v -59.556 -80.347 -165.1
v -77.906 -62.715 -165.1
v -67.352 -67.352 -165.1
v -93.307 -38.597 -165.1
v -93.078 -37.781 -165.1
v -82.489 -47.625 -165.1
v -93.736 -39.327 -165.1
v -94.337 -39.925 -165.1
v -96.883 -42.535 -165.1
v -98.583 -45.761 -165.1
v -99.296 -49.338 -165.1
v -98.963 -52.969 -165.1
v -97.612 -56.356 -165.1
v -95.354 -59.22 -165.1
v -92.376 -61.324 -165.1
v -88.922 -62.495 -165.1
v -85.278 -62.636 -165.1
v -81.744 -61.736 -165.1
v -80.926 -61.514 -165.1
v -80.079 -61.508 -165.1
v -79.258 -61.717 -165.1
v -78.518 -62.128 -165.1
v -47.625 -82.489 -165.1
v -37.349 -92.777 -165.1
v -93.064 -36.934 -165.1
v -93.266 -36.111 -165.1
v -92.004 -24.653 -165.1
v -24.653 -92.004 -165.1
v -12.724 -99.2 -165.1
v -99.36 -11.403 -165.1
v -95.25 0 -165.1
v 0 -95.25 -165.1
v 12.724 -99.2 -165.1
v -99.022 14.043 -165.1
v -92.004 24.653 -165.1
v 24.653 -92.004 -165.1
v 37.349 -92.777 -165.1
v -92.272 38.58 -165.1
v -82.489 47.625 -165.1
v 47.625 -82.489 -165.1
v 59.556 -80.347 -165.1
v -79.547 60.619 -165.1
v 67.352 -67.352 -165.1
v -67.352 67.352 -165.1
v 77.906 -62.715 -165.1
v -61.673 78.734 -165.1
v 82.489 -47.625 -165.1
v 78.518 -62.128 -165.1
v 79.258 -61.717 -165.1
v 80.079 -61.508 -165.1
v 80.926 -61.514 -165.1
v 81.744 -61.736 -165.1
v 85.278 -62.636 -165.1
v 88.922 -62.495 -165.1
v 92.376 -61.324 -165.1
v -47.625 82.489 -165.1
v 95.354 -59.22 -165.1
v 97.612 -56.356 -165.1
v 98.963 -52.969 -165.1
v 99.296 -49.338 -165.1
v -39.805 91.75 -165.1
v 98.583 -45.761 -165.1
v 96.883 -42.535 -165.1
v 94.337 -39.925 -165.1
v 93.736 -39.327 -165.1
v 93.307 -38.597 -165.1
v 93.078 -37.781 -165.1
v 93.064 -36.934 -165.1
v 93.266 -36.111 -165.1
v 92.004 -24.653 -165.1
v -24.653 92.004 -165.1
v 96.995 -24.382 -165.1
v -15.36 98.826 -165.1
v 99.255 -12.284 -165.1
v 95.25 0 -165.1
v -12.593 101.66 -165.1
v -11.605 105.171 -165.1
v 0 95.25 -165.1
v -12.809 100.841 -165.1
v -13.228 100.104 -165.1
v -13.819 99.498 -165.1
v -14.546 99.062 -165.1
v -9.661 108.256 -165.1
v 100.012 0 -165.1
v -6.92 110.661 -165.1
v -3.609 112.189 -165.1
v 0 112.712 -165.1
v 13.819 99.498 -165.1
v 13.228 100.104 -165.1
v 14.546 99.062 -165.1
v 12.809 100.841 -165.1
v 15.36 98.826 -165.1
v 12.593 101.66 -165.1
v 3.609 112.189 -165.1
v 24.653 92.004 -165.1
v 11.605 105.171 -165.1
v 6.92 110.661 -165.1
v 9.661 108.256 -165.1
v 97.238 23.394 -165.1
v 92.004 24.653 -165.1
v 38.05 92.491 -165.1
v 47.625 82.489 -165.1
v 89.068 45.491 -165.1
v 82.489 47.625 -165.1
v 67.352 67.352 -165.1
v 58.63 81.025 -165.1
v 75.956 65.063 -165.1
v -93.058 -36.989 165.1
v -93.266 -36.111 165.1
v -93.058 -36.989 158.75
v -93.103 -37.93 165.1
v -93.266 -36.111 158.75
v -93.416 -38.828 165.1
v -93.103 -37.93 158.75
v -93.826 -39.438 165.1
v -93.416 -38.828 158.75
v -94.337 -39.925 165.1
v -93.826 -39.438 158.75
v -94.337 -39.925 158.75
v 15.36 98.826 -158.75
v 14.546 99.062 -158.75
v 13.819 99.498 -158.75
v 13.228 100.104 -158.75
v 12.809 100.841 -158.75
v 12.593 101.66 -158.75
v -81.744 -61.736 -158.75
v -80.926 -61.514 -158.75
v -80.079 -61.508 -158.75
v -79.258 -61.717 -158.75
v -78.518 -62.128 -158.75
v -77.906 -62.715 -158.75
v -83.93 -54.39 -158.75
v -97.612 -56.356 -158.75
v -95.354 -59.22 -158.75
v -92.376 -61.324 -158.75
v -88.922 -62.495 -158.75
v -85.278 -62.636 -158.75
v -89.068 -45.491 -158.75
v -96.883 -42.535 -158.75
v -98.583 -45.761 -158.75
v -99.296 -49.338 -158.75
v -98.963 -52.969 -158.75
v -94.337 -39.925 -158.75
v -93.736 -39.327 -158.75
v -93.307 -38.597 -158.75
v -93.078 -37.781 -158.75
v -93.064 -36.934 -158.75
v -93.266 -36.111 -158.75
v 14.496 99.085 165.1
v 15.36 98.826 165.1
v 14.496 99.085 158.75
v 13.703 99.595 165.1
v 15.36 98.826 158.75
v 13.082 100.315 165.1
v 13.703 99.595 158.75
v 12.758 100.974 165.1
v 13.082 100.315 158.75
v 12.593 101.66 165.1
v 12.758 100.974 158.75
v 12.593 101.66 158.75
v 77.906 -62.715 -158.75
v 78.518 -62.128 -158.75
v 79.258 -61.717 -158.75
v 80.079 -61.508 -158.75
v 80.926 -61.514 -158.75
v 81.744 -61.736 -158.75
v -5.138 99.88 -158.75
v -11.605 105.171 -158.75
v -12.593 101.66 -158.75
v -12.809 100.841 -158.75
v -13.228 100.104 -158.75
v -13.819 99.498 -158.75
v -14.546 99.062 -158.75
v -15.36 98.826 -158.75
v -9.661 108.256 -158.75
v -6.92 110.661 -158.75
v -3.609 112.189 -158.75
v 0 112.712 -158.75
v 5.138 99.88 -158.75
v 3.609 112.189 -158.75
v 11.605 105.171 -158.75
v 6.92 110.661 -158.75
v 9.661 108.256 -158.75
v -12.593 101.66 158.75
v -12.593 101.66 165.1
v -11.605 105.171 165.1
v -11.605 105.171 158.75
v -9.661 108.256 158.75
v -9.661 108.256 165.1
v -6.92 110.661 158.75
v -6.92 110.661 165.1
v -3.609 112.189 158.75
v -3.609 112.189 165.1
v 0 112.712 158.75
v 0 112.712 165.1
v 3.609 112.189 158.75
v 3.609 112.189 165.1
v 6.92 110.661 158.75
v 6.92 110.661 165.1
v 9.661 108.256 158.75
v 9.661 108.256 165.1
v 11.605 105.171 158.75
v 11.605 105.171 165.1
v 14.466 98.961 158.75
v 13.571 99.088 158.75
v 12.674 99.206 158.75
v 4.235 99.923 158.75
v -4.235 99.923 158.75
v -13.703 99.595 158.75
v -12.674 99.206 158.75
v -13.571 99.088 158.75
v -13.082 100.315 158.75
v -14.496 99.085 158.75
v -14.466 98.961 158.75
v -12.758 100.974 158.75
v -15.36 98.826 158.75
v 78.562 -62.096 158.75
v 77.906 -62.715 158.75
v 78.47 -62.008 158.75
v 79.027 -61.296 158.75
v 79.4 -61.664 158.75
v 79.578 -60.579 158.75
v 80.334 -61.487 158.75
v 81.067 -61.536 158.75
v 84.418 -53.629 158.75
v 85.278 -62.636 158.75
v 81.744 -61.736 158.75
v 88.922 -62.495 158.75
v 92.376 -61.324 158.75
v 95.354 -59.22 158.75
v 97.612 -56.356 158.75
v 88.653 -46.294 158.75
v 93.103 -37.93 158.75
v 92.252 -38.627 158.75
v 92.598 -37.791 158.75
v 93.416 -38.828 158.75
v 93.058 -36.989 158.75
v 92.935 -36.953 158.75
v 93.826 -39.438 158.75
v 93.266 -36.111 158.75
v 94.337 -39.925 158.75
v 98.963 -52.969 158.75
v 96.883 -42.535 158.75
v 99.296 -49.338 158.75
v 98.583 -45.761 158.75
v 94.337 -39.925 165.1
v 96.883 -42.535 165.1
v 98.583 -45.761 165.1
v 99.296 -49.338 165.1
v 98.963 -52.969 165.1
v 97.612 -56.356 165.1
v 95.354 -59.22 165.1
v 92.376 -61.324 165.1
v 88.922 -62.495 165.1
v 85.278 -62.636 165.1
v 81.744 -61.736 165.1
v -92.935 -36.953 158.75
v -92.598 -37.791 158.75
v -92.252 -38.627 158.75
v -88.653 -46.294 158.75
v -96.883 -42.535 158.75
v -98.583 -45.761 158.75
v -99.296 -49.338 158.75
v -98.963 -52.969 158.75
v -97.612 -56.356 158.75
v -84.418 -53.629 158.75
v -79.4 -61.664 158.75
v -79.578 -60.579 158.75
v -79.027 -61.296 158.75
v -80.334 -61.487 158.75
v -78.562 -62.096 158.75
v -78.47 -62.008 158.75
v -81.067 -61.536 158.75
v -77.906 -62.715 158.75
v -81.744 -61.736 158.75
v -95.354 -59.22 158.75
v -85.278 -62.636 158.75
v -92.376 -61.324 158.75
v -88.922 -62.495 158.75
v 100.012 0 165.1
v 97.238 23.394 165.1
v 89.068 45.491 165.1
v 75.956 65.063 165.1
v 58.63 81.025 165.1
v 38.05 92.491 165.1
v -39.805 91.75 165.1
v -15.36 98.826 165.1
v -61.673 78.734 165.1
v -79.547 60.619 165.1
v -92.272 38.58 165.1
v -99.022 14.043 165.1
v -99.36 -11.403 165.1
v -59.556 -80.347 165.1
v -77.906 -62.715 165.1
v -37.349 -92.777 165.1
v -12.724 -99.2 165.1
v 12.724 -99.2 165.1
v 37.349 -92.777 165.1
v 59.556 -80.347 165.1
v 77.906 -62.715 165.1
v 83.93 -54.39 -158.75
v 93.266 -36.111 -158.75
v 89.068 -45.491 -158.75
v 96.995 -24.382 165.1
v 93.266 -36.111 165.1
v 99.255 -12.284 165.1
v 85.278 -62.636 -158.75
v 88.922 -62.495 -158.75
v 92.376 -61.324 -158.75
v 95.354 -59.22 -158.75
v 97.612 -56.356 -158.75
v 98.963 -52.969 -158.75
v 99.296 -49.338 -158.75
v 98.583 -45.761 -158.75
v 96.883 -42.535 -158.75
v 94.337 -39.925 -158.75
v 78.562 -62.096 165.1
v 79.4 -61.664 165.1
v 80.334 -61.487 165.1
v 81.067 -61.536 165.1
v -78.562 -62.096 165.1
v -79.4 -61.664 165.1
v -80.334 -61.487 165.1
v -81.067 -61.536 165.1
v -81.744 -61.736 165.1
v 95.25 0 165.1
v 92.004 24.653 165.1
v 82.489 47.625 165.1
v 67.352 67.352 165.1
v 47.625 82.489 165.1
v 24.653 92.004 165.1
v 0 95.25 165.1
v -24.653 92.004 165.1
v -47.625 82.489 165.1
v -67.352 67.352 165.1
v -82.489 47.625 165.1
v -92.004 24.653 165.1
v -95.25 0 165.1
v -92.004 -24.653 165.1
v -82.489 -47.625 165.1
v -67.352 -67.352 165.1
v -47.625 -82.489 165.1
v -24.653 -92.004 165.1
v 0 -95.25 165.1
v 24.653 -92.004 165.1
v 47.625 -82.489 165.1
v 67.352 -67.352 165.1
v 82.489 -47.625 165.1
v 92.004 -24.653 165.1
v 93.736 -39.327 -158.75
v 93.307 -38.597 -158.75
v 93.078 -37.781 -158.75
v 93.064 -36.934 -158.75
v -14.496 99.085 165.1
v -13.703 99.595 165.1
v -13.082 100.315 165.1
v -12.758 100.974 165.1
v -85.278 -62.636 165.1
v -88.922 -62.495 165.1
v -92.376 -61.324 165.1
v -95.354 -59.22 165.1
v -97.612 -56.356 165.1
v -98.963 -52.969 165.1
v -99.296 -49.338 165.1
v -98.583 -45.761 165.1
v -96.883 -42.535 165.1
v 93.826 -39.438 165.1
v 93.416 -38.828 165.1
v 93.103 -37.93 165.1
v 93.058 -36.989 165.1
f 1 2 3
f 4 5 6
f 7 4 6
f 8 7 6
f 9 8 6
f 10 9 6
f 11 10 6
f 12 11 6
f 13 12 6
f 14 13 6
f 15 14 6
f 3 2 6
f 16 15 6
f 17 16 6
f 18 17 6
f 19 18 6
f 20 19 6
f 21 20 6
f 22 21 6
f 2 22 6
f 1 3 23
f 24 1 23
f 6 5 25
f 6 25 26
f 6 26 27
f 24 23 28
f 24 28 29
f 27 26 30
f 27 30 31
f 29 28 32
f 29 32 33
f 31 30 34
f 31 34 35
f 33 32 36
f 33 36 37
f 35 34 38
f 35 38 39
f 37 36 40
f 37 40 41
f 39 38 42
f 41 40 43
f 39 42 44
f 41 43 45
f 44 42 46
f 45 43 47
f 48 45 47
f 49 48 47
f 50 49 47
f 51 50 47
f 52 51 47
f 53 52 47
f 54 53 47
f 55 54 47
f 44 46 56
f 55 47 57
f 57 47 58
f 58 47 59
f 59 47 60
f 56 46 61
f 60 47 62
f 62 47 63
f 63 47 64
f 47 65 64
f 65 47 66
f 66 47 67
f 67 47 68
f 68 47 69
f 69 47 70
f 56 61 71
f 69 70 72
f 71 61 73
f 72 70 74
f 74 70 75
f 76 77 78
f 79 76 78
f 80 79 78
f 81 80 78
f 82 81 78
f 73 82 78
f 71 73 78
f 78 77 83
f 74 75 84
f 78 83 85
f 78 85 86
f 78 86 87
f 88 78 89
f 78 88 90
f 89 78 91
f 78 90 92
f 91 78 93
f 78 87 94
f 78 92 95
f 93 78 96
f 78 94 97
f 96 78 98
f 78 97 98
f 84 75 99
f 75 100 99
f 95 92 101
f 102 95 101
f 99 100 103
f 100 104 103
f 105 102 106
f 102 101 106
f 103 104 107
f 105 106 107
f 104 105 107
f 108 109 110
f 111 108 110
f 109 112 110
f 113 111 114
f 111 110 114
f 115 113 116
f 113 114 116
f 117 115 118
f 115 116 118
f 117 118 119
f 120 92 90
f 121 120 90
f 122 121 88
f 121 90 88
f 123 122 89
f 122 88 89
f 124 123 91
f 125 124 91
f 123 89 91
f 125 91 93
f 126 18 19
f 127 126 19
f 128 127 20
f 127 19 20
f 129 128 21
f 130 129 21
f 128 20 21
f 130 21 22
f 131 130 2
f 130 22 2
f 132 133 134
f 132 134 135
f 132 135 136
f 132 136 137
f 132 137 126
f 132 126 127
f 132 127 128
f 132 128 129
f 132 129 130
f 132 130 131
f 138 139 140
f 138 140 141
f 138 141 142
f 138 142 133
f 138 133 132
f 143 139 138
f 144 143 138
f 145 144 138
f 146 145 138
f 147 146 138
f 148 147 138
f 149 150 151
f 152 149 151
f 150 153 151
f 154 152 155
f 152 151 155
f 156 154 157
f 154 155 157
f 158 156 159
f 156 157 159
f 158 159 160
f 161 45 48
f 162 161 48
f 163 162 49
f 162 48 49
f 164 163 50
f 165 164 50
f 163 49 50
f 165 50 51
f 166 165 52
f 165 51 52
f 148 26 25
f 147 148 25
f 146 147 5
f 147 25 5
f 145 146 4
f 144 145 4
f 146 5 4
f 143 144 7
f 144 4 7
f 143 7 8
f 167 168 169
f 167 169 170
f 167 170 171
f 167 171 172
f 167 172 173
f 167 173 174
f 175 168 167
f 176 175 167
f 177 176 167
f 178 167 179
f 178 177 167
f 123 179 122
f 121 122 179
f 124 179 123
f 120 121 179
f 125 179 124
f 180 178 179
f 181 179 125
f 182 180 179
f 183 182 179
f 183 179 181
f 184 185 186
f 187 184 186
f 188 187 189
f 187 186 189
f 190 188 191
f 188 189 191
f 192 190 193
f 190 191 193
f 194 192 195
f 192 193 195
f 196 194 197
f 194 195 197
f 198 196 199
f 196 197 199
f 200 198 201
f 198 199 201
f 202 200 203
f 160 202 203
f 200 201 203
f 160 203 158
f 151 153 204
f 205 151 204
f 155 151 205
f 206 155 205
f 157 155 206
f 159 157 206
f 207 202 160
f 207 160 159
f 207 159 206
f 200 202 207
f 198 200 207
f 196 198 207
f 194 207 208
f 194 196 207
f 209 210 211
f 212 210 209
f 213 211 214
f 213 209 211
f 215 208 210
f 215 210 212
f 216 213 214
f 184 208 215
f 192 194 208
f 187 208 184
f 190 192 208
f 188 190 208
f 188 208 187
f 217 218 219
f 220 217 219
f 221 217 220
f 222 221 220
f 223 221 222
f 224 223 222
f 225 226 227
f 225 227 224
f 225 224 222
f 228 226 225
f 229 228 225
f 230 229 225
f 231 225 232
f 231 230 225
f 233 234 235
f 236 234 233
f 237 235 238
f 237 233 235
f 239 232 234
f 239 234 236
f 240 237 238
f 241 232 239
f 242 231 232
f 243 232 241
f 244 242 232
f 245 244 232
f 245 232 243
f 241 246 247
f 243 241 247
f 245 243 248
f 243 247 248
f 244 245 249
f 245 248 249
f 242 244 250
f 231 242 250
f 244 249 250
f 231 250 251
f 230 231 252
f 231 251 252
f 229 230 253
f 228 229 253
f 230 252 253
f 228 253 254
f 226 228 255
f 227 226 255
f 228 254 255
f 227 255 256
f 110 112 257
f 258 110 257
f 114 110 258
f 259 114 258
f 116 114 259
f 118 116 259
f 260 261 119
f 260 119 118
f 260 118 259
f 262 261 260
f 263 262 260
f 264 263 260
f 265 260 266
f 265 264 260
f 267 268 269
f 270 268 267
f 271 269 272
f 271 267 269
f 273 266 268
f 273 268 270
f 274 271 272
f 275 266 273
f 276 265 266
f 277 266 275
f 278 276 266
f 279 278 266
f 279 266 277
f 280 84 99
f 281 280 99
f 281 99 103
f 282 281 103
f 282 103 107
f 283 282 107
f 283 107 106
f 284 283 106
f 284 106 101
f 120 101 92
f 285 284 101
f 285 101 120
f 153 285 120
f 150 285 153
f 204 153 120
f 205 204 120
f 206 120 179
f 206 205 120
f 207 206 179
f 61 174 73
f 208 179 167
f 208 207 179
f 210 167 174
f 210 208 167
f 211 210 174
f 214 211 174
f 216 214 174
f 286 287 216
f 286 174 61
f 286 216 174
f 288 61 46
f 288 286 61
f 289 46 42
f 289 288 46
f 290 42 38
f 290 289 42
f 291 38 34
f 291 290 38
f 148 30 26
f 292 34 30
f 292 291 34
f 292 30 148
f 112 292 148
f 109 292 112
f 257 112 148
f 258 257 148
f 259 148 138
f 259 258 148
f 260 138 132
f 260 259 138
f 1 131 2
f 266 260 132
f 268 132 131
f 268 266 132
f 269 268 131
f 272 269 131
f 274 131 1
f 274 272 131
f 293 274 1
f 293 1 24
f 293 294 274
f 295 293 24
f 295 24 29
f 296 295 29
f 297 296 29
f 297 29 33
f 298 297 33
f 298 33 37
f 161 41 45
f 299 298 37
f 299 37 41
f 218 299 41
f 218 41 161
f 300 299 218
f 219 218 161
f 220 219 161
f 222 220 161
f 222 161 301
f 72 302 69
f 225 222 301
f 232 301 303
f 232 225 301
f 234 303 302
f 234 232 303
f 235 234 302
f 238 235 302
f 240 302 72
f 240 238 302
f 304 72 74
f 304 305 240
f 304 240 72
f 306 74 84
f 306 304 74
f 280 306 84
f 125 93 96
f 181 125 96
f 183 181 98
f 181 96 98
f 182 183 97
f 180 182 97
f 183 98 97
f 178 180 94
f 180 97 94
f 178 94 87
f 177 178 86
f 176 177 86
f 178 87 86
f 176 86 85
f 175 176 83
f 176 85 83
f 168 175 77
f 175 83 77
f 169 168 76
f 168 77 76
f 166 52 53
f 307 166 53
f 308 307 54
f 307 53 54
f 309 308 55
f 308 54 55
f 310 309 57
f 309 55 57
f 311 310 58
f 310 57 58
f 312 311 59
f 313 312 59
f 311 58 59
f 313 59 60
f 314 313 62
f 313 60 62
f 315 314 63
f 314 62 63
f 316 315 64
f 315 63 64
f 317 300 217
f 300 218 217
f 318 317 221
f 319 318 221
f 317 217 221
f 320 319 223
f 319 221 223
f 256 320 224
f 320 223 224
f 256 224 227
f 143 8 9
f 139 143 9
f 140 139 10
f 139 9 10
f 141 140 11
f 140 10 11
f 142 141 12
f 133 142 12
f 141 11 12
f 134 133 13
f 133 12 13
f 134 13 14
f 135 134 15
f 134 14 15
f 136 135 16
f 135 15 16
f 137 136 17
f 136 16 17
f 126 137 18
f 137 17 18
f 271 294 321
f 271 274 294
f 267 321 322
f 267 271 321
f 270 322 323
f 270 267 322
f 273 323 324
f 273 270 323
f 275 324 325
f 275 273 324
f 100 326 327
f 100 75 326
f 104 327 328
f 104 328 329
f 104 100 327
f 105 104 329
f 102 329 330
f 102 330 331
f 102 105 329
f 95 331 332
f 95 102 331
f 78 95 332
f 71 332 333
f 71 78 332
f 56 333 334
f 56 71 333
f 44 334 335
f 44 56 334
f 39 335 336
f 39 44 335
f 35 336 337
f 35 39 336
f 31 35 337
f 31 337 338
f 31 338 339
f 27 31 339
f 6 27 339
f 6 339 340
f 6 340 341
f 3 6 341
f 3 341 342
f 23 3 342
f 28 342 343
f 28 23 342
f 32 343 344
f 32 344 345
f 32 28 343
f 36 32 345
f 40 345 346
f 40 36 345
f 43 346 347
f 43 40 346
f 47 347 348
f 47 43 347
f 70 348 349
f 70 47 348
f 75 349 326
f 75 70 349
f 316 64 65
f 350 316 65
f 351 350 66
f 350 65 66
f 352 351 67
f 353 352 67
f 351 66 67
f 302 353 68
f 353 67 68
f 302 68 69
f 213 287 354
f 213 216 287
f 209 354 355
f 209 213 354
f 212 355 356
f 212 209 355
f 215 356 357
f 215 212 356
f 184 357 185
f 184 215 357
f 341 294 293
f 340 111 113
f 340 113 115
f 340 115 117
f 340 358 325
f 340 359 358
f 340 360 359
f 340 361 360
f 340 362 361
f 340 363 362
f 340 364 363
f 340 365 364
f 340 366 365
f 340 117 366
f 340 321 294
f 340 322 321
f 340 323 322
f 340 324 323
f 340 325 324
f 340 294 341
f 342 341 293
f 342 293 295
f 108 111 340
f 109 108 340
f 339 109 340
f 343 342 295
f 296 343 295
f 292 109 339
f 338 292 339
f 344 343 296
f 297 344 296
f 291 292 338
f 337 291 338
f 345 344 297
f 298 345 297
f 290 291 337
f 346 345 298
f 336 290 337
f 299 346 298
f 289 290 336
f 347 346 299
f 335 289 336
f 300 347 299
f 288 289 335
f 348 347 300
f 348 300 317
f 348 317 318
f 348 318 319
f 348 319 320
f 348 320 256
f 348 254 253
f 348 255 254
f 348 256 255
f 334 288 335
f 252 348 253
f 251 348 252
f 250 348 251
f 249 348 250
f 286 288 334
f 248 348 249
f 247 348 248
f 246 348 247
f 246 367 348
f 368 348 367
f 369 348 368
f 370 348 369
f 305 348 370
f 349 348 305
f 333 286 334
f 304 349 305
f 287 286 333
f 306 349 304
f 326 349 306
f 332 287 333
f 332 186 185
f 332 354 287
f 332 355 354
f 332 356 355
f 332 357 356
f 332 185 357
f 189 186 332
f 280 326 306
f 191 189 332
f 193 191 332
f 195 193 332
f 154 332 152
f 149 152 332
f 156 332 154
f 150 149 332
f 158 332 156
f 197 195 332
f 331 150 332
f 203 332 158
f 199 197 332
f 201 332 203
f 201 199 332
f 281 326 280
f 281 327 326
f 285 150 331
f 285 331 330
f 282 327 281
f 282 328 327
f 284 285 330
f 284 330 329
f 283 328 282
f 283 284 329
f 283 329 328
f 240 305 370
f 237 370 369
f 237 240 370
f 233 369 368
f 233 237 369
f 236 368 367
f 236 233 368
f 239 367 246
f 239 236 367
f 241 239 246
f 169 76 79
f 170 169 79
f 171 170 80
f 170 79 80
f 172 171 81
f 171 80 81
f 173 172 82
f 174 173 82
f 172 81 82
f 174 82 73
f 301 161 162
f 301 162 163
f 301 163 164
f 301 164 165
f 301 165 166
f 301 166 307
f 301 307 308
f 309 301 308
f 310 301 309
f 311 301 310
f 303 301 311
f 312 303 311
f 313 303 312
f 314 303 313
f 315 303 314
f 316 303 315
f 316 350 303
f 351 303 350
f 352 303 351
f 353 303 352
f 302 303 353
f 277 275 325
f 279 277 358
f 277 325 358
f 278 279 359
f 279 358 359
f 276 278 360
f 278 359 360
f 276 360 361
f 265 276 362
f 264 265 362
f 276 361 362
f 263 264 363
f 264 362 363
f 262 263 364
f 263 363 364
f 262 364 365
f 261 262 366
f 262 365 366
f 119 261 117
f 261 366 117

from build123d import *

# Parameters (mm, degrees)
SKETCH1_R                = 100.0125
SKETCH1_R_2              = 95.25
EXTRUDE_THIN1_DEPTH      = 165.1
BOSS_EXTRUDE1_DEPTH      = 6.35
FILLET1_R                = 3.302
CIRPATTERN1_COUNT        = 3
FILLET1_OF_CIRPATTERN1_R = 3.302
MIRROR2_START            = -165.1
MIRROR2_DEPTH            = 6.35


# Read off the part's stored shape, not the designer's step: Mirror2
with BuildPart() as part:
    # Sketch1 → Extrude-Thin1 (new, symmetric)
    with BuildSketch(Plane.XY):
        Circle(SKETCH1_R)
        Circle(SKETCH1_R_2, mode=Mode.SUBTRACT)
    extrude(amount=EXTRUDE_THIN1_DEPTH, both=True)

    # Sketch2 → Boss-Extrude1 (add)
    with BuildSketch(Plane.XY.offset(165.1)):
        with BuildLine():
            ThreePointArc((-12.674375762, 99.206150794), (0, 112.7125), (12.674375762, 99.206150794))
            ThreePointArc((12.674375762, 99.206150794), (0, 100.0125), (-12.674375762, 99.206150794))
        make_face()
    boss_extrude1 = extrude(amount=-BOSS_EXTRUDE1_DEPTH)

    # Fillet1
    fillet1_edges = [part.edges().sort_by_distance(p)[0] for p in [
        (12.674375762, 99.206150794, 161.925),
        (-12.674375762, 99.206150794, 161.925),
    ]]
    fillet(fillet1_edges, radius=FILLET1_R)

    # CirPattern1: Boss-Extrude1 ×3 about axis
    cirpattern1_axis = Axis((0, 0, 0), (0, 0, 1))
    for i in range(1, CIRPATTERN1_COUNT):
        add(boss_extrude1.rotate(cirpattern1_axis, i * 360 / CIRPATTERN1_COUNT))

    # Fillet1 of CirPattern1
    fillet1_of_cirpattern1_edges = [part.edges().sort_by_distance(p)[0] for p in [
        (-92.25223468, -38.62674401, 161.925),
        (-79.577858918, -60.579406784, 161.925),
        (79.577858918, -60.579406784, 161.925),
        (92.25223468, -38.62674401, 161.925),
    ]]
    fillet(fillet1_of_cirpattern1_edges, radius=FILLET1_OF_CIRPATTERN1_R)

    # Mirror2 outline → Mirror2 (add)
    with BuildSketch(Plane.XY.offset(MIRROR2_START)):
        with BuildLine():
            ThreePointArc((12.592634281, 101.660396196), (0, 112.7125), (-12.592634281, 101.660396196))
            ThreePointArc((-12.592634281, 101.660396196), (-13.503928486, 99.78224476), (-15.359608316, 98.826021819))
            ThreePointArc((-15.359608316, 98.826021819), (0, 100.0125), (15.359608316, 98.826021819))
            ThreePointArc((15.359608316, 98.826021819), (13.503928486, 99.78224476), (12.592634281, 101.660396196))
        make_face()
        with BuildLine():
            ThreePointArc((-77.906041293, -62.714821903), (-86.613365696, -50.00625), (-93.265649608, -36.111199916))
            ThreePointArc((-93.265649608, -36.111199916), (-93.165923052, -38.19637726), (-94.336802804, -39.92465691))
            ThreePointArc((-94.336802804, -39.92465691), (-97.611888324, -56.35625), (-81.744168524, -61.735739285))
            ThreePointArc((-81.744168524, -61.735739285), (-79.661994566, -61.5858675), (-77.906041293, -62.714821903))
        make_face()
        with BuildLine():
            ThreePointArc((94.336802804, -39.92465691), (93.165923052, -38.19637726), (93.265649608, -36.111199916))
            ThreePointArc((93.265649608, -36.111199916), (86.613365696, -50.00625), (77.906041293, -62.714821903))
            ThreePointArc((77.906041293, -62.714821903), (79.661994566, -61.5858675), (81.744168524, -61.735739285))
            ThreePointArc((81.744168524, -61.735739285), (97.611888324, -56.35625), (94.336802804, -39.92465691))
        make_face()
    extrude(amount=MIRROR2_DEPTH)


solid = part.part
